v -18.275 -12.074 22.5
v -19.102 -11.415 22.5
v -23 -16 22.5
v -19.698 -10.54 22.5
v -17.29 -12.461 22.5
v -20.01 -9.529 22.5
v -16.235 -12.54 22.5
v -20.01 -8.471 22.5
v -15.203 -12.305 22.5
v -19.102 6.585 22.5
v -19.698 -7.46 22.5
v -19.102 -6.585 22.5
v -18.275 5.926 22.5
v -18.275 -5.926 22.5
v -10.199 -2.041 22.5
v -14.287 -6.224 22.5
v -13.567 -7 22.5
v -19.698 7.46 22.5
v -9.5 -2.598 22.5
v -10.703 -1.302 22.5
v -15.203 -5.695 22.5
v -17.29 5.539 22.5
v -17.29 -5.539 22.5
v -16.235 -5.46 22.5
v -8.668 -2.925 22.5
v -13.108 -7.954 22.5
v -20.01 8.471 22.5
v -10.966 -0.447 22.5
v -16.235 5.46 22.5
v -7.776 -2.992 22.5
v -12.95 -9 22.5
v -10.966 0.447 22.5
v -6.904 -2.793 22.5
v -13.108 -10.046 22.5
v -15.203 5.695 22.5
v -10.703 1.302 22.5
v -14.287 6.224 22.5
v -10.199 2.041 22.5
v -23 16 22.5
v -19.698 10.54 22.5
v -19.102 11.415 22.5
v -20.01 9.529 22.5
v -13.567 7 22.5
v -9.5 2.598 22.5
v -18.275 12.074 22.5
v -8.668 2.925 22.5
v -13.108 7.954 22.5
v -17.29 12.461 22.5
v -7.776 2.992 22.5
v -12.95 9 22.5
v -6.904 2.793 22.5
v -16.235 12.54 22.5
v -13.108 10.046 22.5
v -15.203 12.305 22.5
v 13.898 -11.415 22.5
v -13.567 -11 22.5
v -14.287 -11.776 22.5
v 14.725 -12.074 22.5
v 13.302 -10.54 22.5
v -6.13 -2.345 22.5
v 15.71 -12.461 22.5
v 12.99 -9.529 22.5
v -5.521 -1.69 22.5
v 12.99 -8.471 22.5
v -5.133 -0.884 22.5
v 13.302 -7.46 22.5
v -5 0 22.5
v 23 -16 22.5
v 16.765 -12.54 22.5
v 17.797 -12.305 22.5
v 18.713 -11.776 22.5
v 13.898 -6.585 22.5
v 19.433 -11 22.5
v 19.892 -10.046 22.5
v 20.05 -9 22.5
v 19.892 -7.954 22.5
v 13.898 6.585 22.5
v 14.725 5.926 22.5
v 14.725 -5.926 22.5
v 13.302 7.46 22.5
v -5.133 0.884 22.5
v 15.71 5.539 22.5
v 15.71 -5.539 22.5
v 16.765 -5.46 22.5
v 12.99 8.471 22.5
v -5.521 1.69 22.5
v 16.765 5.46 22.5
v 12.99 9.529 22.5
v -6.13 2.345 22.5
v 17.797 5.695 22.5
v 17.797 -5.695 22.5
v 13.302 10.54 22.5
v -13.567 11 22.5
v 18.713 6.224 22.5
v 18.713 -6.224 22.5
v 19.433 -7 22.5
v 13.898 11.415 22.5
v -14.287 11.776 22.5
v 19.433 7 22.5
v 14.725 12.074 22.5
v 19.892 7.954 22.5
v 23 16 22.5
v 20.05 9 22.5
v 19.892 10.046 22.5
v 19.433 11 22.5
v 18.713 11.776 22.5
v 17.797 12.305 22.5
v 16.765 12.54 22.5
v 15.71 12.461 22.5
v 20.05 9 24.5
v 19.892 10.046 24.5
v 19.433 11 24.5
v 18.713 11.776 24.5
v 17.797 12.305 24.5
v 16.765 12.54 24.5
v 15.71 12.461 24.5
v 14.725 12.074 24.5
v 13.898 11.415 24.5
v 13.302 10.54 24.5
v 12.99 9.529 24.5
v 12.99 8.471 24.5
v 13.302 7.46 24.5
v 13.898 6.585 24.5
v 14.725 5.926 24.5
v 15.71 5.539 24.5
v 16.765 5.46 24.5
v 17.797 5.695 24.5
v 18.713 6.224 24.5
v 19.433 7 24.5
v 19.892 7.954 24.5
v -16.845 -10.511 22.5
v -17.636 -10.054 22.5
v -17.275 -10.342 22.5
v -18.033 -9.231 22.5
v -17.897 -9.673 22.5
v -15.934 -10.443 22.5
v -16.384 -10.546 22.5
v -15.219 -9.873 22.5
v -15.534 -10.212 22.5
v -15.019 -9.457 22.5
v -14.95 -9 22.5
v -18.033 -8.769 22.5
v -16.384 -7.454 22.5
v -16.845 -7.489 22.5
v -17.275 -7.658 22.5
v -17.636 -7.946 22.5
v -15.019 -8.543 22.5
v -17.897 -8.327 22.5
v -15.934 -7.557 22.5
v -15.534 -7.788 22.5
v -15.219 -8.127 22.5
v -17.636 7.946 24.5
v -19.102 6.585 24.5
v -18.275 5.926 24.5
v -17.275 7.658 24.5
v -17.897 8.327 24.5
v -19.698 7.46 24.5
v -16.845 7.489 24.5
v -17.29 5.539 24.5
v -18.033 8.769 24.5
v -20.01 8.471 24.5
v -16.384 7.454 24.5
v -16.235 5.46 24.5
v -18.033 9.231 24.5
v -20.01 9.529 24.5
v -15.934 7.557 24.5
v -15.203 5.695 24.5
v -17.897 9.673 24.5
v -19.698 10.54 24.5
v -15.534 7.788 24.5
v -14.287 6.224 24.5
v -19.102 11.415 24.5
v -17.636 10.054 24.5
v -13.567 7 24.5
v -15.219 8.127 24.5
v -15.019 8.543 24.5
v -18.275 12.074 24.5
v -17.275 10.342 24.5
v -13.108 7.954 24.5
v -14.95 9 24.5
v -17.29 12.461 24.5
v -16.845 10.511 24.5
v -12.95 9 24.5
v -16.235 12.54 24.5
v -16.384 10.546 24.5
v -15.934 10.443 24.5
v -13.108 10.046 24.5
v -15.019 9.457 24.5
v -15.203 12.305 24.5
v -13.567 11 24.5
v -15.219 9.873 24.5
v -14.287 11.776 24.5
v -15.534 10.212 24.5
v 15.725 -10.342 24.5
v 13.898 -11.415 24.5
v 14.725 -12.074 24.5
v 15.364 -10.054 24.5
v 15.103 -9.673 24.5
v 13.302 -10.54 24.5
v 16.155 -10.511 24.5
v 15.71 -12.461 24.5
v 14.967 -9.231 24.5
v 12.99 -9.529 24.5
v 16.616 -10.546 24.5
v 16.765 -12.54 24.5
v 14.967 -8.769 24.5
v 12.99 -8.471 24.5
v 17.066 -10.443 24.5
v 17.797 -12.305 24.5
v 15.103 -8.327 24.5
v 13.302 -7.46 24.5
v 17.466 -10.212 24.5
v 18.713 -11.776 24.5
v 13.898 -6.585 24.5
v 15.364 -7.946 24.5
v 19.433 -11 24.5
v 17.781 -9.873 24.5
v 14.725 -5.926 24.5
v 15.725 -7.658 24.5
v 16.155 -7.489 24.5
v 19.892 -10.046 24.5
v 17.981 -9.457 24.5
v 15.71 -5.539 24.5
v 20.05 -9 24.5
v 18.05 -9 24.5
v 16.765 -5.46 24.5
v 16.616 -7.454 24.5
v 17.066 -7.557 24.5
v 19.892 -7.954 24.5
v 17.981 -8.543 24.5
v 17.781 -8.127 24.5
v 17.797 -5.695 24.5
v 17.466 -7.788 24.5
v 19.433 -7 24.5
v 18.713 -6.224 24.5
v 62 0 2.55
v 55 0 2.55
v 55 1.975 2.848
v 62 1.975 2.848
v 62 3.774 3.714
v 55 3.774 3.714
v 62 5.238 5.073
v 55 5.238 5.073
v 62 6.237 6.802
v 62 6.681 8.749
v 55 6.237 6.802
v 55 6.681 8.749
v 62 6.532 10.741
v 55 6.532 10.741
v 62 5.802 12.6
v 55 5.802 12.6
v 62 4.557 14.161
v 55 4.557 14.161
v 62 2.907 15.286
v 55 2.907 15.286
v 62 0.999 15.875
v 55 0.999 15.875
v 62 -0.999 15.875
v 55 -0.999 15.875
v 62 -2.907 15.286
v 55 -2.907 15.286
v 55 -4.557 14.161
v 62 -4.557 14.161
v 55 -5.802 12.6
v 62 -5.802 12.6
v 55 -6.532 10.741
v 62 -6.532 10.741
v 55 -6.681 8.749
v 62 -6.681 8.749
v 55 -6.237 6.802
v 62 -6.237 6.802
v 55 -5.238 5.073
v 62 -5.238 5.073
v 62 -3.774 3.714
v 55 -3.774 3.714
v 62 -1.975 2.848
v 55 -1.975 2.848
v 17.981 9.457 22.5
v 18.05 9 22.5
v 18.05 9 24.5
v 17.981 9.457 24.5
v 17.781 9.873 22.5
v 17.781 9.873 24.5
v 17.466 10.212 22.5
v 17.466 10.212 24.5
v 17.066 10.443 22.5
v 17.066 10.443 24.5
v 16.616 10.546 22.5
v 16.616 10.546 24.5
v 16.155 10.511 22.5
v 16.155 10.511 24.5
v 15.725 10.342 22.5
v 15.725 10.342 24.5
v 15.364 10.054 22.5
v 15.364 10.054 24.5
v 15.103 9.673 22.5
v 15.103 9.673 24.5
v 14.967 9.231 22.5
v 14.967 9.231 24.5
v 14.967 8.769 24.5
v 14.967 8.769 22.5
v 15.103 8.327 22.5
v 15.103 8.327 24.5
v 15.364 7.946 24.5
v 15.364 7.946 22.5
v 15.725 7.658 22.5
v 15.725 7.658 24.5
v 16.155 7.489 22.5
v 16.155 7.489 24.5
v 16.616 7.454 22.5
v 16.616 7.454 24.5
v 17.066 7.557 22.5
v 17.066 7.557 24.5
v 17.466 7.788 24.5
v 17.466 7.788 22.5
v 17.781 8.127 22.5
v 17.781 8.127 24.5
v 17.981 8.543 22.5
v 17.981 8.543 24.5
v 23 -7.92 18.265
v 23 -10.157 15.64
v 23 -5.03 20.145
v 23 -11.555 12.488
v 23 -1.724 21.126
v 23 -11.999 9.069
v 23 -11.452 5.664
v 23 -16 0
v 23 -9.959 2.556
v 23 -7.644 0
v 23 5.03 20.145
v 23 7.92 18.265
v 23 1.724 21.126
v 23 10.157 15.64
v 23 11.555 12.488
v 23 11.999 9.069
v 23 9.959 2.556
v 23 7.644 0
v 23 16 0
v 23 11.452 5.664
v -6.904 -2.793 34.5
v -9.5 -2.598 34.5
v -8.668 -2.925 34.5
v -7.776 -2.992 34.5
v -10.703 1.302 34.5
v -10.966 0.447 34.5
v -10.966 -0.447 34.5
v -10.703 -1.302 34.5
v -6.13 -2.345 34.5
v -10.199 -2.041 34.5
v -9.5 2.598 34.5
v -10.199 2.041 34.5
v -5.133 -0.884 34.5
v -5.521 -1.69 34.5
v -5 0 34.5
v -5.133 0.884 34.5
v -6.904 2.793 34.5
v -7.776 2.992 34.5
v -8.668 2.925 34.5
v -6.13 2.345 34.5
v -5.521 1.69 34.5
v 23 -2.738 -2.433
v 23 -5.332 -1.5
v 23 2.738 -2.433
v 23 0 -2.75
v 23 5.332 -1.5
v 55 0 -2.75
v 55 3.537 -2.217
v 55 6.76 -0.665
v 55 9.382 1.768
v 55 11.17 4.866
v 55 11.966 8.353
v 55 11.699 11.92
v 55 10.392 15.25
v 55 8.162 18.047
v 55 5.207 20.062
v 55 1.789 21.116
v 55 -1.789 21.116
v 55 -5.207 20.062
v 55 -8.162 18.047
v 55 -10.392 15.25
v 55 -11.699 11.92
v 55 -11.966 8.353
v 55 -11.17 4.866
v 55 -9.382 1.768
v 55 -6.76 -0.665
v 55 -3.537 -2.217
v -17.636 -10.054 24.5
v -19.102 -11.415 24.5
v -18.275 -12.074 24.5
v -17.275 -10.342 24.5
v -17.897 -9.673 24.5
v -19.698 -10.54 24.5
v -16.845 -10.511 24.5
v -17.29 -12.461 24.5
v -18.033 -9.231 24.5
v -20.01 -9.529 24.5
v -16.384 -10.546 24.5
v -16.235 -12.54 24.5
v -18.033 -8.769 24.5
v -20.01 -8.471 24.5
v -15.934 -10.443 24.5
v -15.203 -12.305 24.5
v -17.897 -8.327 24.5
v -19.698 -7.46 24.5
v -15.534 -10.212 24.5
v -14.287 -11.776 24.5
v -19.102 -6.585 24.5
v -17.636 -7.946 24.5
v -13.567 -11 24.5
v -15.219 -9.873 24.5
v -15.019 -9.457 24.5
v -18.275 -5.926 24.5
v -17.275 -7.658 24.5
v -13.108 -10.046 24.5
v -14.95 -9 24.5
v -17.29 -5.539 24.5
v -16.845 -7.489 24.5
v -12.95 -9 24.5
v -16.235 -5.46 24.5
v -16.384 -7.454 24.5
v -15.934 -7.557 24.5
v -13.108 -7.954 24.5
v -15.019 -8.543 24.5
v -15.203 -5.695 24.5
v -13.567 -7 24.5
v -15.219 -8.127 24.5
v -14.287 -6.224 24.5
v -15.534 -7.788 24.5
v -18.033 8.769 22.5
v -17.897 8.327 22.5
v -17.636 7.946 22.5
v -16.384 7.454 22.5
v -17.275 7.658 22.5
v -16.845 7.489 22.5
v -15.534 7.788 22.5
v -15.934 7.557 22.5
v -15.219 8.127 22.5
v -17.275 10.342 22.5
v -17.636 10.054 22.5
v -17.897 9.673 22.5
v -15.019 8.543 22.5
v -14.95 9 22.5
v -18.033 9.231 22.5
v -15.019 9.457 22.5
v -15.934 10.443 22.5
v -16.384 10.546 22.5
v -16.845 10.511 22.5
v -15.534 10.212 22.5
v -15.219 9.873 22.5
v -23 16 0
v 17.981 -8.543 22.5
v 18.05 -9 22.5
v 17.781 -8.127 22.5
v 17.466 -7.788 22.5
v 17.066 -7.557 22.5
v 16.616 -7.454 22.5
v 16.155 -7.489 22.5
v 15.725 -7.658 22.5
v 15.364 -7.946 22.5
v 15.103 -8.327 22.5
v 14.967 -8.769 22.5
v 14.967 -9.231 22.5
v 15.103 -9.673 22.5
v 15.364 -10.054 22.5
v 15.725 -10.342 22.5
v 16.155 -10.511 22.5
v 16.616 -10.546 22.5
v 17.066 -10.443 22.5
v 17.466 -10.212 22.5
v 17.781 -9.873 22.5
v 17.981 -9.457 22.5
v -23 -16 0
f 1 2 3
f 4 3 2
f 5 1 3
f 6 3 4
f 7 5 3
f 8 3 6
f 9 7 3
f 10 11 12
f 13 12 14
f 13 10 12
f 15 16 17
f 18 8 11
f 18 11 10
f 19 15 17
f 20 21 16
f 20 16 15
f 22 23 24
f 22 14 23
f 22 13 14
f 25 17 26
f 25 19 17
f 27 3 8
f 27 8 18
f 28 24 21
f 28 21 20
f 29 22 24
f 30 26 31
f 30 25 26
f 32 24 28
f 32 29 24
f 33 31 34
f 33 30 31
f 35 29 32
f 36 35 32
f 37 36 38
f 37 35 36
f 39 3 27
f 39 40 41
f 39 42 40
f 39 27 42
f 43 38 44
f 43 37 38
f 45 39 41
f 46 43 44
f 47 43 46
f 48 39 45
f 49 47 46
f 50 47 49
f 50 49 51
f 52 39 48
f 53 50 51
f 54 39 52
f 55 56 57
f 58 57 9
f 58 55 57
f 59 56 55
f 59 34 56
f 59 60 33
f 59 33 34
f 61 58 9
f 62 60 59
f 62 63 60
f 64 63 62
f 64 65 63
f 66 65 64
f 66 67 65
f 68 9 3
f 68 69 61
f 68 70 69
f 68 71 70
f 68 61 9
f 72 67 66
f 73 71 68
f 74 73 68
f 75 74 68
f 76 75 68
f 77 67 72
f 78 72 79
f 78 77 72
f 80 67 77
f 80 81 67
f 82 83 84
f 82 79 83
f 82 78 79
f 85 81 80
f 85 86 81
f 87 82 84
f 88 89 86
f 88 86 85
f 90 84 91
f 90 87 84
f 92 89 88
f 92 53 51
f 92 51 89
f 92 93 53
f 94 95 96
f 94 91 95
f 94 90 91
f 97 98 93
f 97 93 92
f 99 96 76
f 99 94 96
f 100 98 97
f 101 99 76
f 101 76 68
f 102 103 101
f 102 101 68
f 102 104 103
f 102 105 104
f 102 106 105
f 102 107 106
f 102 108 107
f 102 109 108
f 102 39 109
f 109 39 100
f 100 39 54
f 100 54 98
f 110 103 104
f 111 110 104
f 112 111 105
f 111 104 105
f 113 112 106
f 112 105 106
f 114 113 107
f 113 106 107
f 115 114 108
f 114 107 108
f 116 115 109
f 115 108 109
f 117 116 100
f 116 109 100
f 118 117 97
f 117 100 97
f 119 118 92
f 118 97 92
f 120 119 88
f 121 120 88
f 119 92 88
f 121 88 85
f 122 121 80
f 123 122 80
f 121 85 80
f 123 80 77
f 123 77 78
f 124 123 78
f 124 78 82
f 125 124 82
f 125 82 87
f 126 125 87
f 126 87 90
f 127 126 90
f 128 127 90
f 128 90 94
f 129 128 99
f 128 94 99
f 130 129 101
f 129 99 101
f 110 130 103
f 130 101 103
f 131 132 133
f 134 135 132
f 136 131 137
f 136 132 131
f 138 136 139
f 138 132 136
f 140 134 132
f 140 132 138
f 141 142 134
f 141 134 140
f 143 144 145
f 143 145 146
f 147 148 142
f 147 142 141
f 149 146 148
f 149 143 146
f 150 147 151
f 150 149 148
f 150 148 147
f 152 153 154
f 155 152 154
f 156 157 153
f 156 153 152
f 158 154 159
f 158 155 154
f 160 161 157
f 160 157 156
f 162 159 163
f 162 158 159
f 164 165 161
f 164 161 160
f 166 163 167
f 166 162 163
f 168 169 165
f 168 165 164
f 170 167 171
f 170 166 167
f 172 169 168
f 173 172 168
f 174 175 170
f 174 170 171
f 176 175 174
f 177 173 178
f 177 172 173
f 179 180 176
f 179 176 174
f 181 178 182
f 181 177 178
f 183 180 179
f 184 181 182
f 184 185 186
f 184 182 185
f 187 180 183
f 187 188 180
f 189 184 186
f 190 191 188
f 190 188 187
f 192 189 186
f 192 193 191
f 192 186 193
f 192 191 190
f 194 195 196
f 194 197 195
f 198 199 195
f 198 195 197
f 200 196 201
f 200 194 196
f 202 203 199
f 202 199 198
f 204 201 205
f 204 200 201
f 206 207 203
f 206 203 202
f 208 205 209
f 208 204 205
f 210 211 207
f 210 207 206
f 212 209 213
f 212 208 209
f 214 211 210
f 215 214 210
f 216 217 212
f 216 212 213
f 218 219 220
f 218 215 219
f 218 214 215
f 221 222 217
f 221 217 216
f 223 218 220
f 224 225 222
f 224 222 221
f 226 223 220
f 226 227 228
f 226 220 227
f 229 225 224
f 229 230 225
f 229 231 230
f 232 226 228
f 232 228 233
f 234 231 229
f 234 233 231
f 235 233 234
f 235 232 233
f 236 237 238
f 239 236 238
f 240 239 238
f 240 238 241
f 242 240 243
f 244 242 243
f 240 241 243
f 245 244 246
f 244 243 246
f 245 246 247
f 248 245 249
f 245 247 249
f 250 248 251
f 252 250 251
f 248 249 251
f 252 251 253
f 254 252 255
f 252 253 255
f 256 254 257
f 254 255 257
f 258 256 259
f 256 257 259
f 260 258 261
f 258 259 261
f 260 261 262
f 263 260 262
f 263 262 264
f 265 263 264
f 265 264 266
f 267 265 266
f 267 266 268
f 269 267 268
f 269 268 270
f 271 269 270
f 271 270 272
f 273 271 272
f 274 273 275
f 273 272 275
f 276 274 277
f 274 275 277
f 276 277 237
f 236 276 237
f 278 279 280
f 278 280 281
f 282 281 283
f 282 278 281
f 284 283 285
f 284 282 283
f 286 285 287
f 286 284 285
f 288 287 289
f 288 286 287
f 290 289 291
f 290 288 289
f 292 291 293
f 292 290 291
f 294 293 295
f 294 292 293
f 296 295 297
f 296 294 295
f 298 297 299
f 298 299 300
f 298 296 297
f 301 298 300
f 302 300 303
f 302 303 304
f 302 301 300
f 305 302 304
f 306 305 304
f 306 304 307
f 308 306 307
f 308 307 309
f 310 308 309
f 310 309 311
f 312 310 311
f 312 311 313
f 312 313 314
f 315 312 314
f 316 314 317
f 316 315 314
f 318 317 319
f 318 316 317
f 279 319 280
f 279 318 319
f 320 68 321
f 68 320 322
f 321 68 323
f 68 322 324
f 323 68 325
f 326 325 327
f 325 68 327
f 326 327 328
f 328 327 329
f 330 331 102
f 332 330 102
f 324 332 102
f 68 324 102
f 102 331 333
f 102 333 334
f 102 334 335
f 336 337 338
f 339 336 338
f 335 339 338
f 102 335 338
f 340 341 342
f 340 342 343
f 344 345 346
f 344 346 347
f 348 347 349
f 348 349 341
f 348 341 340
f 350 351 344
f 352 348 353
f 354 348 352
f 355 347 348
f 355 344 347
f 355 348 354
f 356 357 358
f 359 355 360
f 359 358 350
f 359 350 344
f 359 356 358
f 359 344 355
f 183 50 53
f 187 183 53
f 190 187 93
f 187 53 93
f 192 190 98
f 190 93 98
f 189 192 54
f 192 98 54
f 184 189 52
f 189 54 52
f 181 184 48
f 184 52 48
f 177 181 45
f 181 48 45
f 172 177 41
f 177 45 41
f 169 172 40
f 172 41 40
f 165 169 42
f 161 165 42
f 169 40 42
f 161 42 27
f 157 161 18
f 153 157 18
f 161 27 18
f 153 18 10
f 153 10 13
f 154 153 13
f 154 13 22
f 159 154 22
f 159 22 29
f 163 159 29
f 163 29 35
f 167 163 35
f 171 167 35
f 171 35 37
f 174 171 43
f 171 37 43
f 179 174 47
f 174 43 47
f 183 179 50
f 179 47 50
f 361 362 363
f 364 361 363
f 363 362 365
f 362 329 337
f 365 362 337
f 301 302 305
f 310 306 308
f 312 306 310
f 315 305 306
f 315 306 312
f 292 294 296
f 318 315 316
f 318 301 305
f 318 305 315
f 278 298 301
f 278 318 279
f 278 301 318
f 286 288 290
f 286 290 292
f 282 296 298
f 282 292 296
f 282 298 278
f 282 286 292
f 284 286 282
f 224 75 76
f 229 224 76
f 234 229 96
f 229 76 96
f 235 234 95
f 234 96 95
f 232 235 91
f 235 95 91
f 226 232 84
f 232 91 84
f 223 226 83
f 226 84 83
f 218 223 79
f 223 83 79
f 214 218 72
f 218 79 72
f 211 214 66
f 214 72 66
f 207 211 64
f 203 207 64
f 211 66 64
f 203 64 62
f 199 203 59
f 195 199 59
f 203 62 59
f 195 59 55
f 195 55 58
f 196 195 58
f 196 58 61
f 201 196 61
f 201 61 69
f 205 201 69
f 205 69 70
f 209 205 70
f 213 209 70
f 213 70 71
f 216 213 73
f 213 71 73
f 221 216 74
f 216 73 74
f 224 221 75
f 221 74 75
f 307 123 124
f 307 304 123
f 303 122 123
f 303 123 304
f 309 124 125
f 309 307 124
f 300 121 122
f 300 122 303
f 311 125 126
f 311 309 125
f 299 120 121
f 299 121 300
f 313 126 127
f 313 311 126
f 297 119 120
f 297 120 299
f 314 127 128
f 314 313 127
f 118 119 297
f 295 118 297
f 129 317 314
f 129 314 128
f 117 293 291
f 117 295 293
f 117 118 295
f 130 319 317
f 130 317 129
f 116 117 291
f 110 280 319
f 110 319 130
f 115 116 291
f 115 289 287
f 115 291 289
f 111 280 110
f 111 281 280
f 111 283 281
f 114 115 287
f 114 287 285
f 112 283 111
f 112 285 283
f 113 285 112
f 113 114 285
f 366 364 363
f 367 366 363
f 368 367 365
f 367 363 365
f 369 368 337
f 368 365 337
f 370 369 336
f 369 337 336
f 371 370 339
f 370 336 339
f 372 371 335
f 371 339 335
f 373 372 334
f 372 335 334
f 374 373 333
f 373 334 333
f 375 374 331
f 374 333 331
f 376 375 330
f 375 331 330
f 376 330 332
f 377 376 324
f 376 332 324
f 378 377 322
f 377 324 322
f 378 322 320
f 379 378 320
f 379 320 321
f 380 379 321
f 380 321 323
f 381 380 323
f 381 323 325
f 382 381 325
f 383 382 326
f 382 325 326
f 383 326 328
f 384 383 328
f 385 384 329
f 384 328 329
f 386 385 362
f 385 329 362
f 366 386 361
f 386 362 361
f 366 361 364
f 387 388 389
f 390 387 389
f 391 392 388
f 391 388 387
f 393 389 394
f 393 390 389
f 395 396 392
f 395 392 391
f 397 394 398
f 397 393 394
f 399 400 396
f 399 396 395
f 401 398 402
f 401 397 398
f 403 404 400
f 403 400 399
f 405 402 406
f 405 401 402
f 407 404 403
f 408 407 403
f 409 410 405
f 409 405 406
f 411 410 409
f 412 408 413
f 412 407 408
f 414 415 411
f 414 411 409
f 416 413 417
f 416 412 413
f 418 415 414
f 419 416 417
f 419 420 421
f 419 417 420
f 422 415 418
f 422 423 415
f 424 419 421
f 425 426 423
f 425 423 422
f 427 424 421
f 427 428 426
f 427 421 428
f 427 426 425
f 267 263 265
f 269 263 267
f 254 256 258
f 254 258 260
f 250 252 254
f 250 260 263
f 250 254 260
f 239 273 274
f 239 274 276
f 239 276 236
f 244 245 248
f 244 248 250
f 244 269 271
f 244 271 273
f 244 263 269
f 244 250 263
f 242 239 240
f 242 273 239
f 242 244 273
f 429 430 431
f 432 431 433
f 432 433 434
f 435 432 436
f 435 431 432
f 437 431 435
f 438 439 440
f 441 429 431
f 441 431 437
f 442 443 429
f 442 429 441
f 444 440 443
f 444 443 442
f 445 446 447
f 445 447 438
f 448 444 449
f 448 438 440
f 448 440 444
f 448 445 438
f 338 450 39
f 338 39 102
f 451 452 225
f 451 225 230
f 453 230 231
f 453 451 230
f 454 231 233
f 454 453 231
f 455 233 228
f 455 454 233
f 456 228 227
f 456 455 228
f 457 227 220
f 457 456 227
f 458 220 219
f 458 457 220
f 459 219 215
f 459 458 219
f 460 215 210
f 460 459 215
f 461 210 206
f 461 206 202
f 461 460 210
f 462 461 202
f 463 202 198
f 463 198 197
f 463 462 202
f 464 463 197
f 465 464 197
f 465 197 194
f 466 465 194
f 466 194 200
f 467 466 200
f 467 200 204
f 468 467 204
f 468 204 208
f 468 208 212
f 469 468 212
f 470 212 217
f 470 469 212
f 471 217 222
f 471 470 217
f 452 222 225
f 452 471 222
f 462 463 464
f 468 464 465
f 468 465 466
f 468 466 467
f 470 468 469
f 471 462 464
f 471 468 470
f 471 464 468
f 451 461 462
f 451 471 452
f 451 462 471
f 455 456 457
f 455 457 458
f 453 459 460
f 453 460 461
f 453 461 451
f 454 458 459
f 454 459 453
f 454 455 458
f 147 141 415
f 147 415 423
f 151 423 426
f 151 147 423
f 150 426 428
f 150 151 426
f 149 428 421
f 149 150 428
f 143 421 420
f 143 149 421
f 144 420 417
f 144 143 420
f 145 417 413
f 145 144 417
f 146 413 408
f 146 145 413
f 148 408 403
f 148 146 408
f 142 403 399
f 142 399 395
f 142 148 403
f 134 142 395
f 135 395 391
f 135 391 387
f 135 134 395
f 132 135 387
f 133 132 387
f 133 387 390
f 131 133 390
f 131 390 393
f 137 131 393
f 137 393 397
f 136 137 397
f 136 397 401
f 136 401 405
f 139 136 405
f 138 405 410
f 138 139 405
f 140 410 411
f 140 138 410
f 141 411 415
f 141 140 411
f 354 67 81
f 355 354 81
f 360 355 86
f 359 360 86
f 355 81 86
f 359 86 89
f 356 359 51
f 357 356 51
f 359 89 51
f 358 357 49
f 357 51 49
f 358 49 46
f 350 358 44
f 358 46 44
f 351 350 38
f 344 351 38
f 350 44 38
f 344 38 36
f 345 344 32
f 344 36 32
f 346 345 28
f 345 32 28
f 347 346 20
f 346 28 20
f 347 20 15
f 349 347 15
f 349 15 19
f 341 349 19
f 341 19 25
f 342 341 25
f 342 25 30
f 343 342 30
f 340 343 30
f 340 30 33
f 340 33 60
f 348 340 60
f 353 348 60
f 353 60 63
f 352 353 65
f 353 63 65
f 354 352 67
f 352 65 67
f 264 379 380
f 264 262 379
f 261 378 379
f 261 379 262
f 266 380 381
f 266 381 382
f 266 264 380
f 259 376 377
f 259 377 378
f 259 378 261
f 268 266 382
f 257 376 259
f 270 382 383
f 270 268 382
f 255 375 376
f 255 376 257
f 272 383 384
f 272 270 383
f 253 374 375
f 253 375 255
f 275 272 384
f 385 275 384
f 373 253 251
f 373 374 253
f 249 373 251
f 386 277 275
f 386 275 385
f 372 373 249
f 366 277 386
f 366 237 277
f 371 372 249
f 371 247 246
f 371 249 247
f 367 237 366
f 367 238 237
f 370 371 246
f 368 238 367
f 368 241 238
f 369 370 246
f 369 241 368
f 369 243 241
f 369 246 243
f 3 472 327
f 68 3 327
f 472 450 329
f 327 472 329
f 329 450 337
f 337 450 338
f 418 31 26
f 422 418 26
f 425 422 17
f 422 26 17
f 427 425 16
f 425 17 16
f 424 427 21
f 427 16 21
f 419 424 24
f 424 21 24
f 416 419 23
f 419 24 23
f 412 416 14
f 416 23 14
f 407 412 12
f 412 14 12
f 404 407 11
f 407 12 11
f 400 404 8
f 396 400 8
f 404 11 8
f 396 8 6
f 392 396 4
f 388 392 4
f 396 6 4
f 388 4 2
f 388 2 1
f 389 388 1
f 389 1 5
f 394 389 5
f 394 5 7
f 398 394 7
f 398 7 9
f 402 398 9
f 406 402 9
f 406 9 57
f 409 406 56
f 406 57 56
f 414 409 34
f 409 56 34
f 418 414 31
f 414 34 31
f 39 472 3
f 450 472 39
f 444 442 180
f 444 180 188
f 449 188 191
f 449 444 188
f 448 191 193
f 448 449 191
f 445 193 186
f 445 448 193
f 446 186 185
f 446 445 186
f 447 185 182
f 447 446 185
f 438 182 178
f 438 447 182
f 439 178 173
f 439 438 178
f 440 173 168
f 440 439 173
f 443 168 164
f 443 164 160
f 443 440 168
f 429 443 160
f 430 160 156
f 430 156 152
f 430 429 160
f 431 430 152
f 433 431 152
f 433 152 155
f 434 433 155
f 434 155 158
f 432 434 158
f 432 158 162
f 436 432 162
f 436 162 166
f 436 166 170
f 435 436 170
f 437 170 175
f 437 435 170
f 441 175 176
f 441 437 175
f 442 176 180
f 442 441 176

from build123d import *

# Parameters (mm, degrees)
SKETCH2_W           = 46
SKETCH2_H           = 32
BOSS_EXTRUDE1_DEPTH = 22.5
SKETCH3_R           = 3
BOSS_EXTRUDE2_DEPTH = 12
SKETCH4_R           = 3.55
SKETCH4_R_2         = 1.55
BOSS_EXTRUDE3_DEPTH = 2
SKETCH5_R           = 12
BOSS_EXTRUDE4_DEPTH = 32
SKETCH6_R           = 6.7
BOSS_EXTRUDE5_DEPTH = 7


with BuildPart() as part:
    # Sketch2 → Boss-Extrude1 (new body)
    with BuildSketch(Plane.XY):
        Rectangle(SKETCH2_W, SKETCH2_H)
    extrude(amount=BOSS_EXTRUDE1_DEPTH)

    # Sketch3 → Boss-Extrude2 (add)
    with BuildSketch(Plane.XY.offset(22.5)):
        with Locations((-8, 0)):
            Circle(SKETCH3_R)
    extrude(amount=BOSS_EXTRUDE2_DEPTH)

    # Sketch4 → Boss-Extrude3 (add)
    with BuildSketch(Plane.XY.offset(22.5)):
        with Locations((-16.5, 9)):
            Circle(SKETCH4_R)
        with Locations((-16.5, 9)):
            Circle(SKETCH4_R_2, mode=Mode.SUBTRACT)
        with Locations((-16.5, -9)):
            Circle(SKETCH4_R)
        with Locations((-16.5, -9)):
            Circle(SKETCH4_R_2, mode=Mode.SUBTRACT)
        with Locations((16.5, -9)):
            Circle(SKETCH4_R)
        with Locations((16.5, -9)):
            Circle(SKETCH4_R_2, mode=Mode.SUBTRACT)
        with Locations((16.5, 9)):
            Circle(SKETCH4_R)
        with Locations((16.5, 9)):
            Circle(SKETCH4_R_2, mode=Mode.SUBTRACT)
    extrude(amount=BOSS_EXTRUDE3_DEPTH)

    # Sketch5 → Boss-Extrude4 (add)
    with BuildSketch(Plane(origin=(23, 0, 0), x_dir=(0, 0, -1), z_dir=(1, 0, 0))):
        with Locations((-9.25, 0)):
            Circle(SKETCH5_R)
    extrude(amount=BOSS_EXTRUDE4_DEPTH)

    # Sketch6 → Boss-Extrude5 (add)
    with BuildSketch(Plane(origin=(55, 0, 0), x_dir=(0, 0, -1), z_dir=(1, 0, 0))):
        with Locations((-9.25, 0)):
            Circle(SKETCH6_R)
    extrude(amount=BOSS_EXTRUDE5_DEPTH)


solid = part.part
